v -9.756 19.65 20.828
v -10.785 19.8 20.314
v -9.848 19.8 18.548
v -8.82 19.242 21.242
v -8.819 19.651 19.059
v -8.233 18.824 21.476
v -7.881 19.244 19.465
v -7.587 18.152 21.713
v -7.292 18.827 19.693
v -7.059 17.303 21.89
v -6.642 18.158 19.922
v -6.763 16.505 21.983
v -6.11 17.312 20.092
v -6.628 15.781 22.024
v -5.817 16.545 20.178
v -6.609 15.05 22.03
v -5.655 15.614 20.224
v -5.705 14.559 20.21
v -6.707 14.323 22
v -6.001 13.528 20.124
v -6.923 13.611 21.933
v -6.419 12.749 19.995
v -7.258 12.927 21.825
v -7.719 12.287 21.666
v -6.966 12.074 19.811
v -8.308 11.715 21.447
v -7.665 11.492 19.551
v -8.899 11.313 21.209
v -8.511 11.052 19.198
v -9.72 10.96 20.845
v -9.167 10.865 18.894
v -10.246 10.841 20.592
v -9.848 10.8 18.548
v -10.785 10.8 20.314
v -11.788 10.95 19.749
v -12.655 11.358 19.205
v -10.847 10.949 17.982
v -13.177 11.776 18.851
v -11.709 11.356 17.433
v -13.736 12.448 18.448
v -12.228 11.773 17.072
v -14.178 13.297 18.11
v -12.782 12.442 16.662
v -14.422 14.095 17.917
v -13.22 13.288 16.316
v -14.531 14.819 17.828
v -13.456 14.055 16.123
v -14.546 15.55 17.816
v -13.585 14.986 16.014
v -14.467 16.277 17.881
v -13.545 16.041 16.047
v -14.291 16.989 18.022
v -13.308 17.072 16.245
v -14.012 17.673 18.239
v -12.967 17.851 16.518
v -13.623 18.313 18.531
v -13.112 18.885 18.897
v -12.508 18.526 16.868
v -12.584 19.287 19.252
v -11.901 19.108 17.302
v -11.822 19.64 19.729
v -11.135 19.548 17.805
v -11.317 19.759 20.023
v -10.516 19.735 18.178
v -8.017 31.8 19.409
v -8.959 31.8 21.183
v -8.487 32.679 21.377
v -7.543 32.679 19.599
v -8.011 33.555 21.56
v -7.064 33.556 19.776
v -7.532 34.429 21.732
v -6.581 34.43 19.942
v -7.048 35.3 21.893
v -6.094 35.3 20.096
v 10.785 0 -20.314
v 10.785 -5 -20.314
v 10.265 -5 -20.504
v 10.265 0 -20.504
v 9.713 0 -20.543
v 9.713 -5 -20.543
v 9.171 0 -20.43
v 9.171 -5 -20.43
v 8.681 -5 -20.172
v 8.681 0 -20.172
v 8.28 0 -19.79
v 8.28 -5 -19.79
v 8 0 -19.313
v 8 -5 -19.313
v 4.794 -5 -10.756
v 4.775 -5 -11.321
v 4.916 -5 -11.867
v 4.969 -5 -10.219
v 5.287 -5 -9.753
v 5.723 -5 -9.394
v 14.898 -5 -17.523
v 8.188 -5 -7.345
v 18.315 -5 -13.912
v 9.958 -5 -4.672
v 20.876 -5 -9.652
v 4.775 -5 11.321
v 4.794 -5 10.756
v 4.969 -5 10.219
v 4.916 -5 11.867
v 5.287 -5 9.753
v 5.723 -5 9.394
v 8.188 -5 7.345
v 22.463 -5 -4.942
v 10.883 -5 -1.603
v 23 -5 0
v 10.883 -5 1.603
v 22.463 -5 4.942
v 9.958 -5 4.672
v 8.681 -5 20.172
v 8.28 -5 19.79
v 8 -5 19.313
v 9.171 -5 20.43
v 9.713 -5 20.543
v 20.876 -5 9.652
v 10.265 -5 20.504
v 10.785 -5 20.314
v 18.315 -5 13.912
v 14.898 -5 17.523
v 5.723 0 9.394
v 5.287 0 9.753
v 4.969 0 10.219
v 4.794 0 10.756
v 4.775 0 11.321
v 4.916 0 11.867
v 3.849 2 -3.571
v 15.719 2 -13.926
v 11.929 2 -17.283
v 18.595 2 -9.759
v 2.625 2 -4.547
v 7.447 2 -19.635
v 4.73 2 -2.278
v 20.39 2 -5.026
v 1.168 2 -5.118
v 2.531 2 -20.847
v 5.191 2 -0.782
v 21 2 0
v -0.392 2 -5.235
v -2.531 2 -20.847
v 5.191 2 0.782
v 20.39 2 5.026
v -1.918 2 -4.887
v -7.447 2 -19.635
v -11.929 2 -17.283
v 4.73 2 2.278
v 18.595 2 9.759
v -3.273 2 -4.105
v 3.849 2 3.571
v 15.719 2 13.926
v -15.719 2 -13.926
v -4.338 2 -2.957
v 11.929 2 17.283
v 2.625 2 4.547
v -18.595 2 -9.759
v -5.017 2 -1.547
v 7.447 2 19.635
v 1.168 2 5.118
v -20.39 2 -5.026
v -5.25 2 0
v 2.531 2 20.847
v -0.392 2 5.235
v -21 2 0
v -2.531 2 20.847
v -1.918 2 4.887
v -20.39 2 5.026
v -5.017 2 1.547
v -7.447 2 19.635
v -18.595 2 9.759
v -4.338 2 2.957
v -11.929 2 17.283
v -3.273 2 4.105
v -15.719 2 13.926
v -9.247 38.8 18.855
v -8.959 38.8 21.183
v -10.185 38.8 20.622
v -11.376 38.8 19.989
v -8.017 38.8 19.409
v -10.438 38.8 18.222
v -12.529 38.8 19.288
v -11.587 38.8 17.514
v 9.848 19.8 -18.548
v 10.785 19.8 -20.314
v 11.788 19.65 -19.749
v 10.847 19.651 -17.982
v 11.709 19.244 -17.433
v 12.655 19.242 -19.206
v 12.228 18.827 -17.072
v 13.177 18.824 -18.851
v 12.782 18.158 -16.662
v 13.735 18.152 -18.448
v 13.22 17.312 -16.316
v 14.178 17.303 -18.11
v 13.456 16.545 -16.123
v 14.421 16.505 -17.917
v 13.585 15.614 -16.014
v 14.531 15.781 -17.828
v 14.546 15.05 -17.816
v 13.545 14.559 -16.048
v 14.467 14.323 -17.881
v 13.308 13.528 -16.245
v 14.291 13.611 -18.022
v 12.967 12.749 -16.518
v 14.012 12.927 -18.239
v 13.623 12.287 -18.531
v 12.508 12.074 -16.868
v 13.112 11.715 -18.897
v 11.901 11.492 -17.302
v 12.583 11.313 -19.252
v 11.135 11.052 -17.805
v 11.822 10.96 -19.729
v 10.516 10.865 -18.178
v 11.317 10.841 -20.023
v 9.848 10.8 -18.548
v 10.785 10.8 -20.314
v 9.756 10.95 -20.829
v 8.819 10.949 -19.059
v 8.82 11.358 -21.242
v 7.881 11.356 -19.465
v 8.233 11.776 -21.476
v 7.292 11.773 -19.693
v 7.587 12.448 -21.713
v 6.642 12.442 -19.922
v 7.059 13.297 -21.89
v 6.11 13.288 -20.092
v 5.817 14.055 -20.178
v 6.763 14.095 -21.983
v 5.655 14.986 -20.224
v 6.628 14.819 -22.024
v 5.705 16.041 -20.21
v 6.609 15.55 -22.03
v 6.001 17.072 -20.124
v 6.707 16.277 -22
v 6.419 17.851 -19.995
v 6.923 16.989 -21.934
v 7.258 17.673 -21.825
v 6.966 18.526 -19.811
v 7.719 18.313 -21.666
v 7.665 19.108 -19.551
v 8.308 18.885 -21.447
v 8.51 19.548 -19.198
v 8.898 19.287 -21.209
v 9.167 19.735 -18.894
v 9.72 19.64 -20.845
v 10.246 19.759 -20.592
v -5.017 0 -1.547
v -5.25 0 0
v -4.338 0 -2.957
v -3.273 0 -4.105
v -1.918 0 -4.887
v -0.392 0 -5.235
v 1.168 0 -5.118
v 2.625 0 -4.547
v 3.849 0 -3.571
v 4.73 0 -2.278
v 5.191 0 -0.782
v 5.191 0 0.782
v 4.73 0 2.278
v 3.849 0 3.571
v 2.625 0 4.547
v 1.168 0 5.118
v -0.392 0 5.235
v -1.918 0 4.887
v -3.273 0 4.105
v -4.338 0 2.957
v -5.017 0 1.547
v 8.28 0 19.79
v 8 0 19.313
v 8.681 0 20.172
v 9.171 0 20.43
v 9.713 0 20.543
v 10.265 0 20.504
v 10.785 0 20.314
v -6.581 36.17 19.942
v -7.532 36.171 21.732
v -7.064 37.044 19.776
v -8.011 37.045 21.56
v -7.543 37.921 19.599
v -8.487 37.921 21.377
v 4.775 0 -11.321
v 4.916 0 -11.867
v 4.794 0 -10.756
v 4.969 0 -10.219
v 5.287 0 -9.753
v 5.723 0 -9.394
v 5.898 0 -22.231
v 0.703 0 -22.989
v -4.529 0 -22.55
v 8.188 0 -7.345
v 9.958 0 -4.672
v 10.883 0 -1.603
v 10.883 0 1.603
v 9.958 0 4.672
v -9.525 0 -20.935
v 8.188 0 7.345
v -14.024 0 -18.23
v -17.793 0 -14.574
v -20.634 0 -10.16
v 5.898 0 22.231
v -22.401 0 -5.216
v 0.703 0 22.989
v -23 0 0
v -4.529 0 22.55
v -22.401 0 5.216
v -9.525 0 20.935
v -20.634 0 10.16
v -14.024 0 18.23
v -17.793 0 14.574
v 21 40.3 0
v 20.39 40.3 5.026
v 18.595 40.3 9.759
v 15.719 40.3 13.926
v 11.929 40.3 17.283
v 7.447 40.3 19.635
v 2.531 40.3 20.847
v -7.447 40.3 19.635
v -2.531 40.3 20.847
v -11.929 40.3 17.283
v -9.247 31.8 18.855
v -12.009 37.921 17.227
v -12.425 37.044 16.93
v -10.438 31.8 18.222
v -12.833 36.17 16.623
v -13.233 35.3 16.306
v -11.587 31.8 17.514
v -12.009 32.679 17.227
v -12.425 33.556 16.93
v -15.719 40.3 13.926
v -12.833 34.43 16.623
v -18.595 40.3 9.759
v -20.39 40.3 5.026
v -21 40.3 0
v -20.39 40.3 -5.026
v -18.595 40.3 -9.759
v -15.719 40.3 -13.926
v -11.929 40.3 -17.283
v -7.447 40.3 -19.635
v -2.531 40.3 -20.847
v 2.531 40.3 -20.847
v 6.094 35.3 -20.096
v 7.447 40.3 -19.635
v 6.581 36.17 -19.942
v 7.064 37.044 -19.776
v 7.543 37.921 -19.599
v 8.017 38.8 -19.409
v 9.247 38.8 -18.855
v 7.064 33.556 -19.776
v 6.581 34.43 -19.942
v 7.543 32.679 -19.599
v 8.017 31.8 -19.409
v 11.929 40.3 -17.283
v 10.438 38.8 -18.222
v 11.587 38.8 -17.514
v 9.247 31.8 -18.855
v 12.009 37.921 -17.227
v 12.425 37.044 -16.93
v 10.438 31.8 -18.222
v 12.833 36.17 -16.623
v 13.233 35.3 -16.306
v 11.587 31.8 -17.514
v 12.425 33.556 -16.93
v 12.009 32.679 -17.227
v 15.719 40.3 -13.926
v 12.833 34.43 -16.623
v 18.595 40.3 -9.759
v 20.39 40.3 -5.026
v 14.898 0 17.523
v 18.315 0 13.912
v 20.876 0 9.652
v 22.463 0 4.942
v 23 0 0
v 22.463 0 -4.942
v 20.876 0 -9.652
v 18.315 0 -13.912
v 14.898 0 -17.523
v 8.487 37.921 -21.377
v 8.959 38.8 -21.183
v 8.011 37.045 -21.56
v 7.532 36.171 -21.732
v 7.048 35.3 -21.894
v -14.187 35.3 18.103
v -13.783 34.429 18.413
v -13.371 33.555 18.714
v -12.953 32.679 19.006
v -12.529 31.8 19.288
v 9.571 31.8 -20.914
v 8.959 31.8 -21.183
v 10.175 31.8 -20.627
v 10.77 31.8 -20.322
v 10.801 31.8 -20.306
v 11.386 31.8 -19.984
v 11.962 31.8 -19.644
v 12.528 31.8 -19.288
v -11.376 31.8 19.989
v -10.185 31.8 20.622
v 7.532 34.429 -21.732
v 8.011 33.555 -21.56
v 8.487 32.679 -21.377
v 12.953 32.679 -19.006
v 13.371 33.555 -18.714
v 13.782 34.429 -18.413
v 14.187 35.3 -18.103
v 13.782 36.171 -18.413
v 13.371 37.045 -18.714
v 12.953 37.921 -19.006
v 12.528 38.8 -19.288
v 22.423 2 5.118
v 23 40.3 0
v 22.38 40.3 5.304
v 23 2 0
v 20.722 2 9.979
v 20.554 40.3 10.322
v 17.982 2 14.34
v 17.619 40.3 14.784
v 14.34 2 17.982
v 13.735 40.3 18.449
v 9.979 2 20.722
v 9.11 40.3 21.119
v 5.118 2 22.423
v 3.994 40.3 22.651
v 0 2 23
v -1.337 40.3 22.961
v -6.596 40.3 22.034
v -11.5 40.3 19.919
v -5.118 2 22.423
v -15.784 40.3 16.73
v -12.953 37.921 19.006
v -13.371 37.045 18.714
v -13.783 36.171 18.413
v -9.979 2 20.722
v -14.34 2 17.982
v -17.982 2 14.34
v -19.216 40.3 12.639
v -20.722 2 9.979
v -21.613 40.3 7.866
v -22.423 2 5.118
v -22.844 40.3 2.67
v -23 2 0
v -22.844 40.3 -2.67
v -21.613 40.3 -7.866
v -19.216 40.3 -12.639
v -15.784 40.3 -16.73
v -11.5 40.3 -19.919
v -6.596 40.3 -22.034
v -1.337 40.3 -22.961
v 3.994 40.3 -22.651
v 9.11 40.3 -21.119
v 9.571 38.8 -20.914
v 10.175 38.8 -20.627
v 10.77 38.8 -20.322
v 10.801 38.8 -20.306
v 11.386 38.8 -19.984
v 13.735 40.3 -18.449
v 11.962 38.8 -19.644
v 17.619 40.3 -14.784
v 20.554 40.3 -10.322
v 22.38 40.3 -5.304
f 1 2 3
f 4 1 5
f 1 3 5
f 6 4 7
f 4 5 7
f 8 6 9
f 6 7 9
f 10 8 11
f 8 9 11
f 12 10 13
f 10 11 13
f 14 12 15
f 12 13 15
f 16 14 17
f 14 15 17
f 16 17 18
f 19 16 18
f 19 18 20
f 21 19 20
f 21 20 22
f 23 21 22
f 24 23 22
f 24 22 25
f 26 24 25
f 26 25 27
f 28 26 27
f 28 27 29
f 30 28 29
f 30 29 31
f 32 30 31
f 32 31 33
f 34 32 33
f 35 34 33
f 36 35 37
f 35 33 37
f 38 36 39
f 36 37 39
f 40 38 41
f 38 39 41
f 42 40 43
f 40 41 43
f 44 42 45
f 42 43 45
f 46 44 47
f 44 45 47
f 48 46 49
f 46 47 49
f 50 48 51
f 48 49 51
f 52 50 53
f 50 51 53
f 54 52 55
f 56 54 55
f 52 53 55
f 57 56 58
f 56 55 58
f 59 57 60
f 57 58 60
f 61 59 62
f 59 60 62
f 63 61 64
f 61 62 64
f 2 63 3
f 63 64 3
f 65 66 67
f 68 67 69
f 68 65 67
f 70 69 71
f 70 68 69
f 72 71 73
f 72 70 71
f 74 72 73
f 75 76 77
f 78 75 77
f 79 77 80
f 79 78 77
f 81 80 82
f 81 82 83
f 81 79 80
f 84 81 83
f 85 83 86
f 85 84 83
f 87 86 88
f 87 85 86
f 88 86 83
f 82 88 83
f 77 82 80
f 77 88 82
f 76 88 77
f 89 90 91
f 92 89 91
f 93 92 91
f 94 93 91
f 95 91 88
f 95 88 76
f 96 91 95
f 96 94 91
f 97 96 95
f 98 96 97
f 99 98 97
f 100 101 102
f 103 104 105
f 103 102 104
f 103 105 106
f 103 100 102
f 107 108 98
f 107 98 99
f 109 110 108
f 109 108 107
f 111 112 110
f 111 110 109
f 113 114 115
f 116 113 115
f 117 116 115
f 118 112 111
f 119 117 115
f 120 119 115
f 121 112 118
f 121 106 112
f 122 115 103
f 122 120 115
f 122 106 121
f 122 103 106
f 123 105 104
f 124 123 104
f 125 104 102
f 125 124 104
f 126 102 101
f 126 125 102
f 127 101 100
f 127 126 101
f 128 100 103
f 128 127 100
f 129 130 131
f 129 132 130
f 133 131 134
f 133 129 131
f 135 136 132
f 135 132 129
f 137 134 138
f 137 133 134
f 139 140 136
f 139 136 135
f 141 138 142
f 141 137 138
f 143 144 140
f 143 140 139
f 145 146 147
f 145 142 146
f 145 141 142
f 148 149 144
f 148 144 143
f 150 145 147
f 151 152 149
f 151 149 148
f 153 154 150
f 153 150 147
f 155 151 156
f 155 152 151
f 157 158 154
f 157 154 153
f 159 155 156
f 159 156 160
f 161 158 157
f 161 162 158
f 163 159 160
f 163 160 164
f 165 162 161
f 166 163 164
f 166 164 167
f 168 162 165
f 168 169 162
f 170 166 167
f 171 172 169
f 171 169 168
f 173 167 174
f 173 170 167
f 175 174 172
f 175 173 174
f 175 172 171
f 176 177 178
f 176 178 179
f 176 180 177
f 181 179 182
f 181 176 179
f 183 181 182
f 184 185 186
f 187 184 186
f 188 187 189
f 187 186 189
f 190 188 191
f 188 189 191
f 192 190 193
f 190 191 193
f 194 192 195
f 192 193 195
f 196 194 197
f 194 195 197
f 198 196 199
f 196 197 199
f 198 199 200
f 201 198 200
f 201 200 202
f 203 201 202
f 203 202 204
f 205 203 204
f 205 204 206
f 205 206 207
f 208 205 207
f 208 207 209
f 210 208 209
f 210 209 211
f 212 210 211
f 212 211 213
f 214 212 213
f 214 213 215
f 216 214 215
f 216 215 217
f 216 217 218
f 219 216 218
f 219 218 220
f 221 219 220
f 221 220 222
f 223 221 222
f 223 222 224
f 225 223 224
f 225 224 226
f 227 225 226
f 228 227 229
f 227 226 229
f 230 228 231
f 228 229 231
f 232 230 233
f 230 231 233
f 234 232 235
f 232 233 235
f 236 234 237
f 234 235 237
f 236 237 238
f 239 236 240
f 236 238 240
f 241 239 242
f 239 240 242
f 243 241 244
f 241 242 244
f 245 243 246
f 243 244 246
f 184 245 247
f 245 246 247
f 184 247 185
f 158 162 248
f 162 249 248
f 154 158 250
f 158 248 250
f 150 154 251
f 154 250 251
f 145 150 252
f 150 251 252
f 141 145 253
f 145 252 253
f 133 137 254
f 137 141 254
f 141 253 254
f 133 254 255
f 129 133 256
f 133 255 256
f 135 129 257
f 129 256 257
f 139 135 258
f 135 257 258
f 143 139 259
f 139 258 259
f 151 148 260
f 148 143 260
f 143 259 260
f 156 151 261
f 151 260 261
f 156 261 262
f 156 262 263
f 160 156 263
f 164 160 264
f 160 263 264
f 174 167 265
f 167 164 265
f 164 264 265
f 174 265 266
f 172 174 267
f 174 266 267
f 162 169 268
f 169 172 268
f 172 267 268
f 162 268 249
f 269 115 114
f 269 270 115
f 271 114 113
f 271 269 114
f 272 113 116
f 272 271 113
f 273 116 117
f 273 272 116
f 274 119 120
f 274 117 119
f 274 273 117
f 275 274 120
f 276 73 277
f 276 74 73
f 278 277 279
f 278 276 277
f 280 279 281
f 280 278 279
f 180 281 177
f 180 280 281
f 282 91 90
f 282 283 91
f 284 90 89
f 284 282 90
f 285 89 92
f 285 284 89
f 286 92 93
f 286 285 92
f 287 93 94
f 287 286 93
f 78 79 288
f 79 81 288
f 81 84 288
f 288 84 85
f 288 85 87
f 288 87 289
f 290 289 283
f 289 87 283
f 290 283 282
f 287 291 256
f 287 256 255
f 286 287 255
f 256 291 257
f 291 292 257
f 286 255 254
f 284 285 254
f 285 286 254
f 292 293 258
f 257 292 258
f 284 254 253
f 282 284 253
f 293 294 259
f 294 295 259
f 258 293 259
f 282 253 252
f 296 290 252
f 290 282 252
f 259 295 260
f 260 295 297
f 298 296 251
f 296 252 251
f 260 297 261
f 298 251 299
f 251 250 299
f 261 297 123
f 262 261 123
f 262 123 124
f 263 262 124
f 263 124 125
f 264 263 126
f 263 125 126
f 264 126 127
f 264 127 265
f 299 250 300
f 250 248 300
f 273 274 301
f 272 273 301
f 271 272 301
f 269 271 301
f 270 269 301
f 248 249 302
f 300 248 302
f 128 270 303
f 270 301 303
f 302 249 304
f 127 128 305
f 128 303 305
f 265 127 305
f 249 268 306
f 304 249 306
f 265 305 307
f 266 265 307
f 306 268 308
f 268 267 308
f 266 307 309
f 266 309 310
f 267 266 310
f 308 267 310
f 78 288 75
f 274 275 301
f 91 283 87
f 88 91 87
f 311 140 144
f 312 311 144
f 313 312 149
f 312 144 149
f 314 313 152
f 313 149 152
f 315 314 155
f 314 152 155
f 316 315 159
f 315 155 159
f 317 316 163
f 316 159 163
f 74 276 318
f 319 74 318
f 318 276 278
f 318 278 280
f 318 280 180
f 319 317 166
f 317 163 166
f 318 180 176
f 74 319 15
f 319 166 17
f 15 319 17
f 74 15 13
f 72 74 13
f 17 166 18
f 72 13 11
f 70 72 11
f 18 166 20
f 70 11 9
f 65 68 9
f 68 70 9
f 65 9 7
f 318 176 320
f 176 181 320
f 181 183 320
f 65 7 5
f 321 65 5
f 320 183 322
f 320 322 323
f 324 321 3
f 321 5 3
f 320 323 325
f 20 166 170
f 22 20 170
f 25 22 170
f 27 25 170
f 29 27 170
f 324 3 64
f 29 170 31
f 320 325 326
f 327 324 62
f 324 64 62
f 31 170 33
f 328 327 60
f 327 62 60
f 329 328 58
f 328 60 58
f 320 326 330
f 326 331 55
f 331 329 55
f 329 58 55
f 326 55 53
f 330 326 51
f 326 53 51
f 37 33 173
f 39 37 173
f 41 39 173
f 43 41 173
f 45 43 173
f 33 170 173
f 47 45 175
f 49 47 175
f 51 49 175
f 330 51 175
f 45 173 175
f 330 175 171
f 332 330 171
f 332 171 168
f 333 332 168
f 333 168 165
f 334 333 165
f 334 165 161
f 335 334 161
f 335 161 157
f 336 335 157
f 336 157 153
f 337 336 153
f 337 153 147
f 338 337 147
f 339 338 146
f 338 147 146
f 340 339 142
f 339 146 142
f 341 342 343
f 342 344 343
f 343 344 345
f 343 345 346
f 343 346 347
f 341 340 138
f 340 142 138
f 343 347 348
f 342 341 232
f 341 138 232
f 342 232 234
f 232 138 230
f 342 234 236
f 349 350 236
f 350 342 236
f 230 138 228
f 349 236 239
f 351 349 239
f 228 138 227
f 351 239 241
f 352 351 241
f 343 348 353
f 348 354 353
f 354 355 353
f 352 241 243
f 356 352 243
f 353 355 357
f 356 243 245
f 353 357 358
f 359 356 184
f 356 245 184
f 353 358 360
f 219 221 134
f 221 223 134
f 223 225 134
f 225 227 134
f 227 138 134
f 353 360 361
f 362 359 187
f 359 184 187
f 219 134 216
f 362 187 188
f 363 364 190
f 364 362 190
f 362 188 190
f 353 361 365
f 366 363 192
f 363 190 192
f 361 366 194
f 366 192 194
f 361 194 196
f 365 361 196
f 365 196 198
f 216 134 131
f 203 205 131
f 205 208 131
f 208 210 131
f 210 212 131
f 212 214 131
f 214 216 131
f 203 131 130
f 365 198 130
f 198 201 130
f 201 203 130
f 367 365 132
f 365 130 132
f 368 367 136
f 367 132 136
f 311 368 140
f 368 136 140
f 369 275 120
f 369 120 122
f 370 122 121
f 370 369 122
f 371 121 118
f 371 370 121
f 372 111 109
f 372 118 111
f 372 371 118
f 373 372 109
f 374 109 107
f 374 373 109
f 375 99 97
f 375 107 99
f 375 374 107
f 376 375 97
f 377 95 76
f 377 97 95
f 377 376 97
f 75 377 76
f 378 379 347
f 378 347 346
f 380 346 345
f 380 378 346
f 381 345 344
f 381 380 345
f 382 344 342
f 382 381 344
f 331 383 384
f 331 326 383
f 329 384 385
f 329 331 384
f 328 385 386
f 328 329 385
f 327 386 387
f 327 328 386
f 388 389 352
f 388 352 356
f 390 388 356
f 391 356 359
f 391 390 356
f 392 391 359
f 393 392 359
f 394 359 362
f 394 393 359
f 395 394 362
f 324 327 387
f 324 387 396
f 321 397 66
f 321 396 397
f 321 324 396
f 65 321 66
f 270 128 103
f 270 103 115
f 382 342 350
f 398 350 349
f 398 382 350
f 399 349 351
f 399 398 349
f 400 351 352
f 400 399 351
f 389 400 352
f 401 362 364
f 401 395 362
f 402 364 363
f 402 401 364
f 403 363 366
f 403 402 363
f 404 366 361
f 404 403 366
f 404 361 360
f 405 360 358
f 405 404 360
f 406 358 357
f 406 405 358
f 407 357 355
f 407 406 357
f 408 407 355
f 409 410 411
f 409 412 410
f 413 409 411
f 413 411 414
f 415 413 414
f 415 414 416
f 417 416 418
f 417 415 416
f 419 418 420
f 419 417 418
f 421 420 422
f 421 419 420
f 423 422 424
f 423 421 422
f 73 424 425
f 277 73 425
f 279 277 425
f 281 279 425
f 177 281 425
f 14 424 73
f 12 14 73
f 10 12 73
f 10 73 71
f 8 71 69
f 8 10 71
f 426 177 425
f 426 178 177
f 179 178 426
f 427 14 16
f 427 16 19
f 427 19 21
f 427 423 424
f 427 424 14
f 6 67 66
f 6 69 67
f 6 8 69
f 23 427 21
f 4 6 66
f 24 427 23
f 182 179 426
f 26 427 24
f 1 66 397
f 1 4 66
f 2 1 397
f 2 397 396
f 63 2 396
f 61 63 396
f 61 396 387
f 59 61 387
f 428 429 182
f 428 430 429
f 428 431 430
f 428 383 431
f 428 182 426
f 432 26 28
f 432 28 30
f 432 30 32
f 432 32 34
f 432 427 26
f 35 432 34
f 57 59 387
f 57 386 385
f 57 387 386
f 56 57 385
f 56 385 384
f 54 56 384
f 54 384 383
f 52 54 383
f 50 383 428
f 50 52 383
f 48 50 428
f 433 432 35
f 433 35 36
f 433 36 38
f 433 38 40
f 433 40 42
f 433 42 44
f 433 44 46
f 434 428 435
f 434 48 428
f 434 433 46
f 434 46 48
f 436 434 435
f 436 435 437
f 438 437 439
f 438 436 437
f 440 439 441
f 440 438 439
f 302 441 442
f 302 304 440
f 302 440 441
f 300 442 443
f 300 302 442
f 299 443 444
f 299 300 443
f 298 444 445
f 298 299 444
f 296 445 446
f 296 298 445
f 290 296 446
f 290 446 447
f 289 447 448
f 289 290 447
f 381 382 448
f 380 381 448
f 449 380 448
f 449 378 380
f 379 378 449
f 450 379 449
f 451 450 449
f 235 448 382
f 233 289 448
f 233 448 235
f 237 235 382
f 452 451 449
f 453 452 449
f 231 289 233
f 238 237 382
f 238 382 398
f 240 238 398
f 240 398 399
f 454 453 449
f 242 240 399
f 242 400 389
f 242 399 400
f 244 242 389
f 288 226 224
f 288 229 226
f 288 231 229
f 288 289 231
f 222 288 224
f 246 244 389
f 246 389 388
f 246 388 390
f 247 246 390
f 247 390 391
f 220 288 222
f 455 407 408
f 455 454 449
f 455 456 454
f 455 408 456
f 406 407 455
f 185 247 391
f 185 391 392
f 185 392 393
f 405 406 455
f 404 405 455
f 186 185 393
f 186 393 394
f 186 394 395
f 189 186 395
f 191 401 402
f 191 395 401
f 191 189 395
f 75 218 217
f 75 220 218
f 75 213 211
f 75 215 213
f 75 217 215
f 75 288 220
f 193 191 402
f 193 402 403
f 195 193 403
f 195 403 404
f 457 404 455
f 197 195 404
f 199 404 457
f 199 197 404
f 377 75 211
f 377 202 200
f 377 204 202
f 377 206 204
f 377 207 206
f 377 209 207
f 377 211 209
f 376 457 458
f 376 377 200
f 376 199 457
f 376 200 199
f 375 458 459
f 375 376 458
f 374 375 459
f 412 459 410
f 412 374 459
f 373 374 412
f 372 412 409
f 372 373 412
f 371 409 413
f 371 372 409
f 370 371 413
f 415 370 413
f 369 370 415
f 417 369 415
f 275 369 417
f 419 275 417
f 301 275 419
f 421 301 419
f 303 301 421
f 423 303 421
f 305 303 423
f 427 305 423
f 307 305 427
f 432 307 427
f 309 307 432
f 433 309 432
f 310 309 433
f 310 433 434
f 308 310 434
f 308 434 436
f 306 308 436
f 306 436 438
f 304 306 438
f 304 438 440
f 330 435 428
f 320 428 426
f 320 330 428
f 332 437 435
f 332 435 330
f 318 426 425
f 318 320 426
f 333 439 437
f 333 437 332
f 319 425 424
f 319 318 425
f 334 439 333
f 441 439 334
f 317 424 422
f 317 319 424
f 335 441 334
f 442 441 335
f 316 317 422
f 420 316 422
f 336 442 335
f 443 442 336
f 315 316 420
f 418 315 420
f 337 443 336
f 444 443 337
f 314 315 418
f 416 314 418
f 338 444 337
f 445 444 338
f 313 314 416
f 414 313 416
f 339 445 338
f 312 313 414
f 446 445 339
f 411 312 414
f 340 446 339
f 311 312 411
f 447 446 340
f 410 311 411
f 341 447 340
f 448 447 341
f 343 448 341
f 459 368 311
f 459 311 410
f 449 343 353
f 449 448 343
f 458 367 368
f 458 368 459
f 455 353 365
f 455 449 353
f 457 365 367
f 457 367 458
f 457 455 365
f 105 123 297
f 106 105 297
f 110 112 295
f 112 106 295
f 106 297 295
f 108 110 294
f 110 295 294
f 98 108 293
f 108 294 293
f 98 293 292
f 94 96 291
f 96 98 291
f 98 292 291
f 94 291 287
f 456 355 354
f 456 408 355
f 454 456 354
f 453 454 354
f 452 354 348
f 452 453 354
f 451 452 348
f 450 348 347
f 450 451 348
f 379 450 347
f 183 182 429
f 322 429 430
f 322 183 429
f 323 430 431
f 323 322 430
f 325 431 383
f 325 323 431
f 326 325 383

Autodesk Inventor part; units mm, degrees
ref_plane "YZ Plane" through (0, 0, 0) normal (1, 0, 0) x (0, 1, 0)
ref_plane "XZ Plane" through (0, 0, 0) normal (0, 1, 0) x (-1, 0, 0)
ref_plane "XY Plane" through (0, 0, 0) normal (0, 0, 1) x (1, 0, 0)
sketch "Sketch1" plane through (0, 0, 0) normal (0, 1, 0) x (-1, 0, 0)
  circle A0 centre (0, 0) radius 23
  circle A1 centre (0, 0) radius 5.25
  dimension "d0" = 46
  dimension "d3" = 10.5
extrude "Extrusion1" add sketch "Sketch1" along normal blind 2
sketch "Sketch2" plane through (0, 2, 0) normal (0, 1, 0) x (1, 0, 0)
  circle A0 centre (0, 0) radius 21
  circle A1 centre (0, 0) radius 23 projected
  line L0 (0, -23) -> (0, -21)
  line L1 (0, 21) -> (0, 23)
  dimension "d4" = 42
extrude "Extrusion2" add sketch "Sketch2" along normal blind 38.3 contours A0 L1 A1 L0 | A0 L0 A1 L1
sketch "Sketch4" plane through (0, 0, 0) normal (0, -1, 0) x (1, 0, 0)
  circle A0 centre (0, 0) radius 5.25 projected
  arc A1 (6.5056, -15.706) -> (6.5056, 15.706) centre (0, 0) ccw construction
  arc A2 (8.8017, -21.2492) -> (8.8017, 21.2492) centre (0, 0) ccw
  arc A3 (4.2095, -10.1627) -> (4.2095, 10.1627) centre (0, 0) ccw
  arc A4 (4.2095, -10.1627) -> (8.8017, -21.2492) centre (6.5056, -15.706) ccw
  arc A5 (8.8017, 21.2492) -> (4.2095, 10.1627) centre (6.5056, 15.706) ccw
  line L0 (0, 0) -> (6.5056, 15.706) construction
  line L1 (0, 0) -> (17, 0) construction
  line L2 (0, 0) -> (6.5056, -15.706) construction
  line L3 (4.2095, -10.1627) -> (8.8017, -21.2492)
  line L4 (4.2095, 10.1627) -> (8.8017, 21.2492)
  dimension "d13" = 17
  dimension "d14" = 67.5
  dimension "d15" = 135
  dimension "d16" = 12
extrude "Extrusion4" add sketch "Sketch4" along normal blind 5 contours L3 A3 L4 A2
fillet "Fillet1" radius 2 4 edges at (4.2095, -2.5, -10.1627) (8.8017, -2.5, -21.2492) (4.2095, -2.5, 10.1627) (8.8017, -2.5, 21.2492)
ref_plane "Work Plane1" through (10.7854, 0, -20.3144) normal (0.4689325, 0, -0.883234) x (0, 1, 0)
sketch "Sketch5" plane through (10.7854, 0, -20.3144) normal (0.4689325, 0, -0.883234) x (0, 1, 0)
  line L0 (40.3, -23) -> (40.3, 23) projected
  line L1 (31.8, -2.0207) -> (31.8, 2.0207)
  line L2 (31.8, 2.0207) -> (35.3, 4.0415)
  line L3 (35.3, 4.0415) -> (38.8, 2.0207)
  line L4 (38.8, 2.0207) -> (38.8, -2.0207)
  line L5 (38.8, -2.0207) -> (35.3, -4.0415)
  line L6 (35.3, -4.0415) -> (31.8, -2.0207)
  point P0 (0, 0)
  point P1 (35.3, 0)
  point P2 (40.3, 0)
  dimension "d21" = 7
  dimension "d22" = 5
  dimension "d23" = 0
extrude "Extrusion5" cut sketch "Sketch5" against normal through all
sketch "Sketch6" plane through (10.7854, 0, -20.3144) normal (0.4689325, 0, -0.883234) x (0, 1, 0)
  line L0 (0, 0) -> (12.5, 0)
  line L1 (12.5, 0) -> (15.3, 0)
  circle A0 centre (15.3, 0) radius 4.5
  dimension "d26" = 12.5
  dimension "d28" = 2.8
  dimension "d29" = 9
extrude "Extrusion6" cut sketch "Sketch6" against normal through all
properties part number "BasePotentiometer_3DPrint"
